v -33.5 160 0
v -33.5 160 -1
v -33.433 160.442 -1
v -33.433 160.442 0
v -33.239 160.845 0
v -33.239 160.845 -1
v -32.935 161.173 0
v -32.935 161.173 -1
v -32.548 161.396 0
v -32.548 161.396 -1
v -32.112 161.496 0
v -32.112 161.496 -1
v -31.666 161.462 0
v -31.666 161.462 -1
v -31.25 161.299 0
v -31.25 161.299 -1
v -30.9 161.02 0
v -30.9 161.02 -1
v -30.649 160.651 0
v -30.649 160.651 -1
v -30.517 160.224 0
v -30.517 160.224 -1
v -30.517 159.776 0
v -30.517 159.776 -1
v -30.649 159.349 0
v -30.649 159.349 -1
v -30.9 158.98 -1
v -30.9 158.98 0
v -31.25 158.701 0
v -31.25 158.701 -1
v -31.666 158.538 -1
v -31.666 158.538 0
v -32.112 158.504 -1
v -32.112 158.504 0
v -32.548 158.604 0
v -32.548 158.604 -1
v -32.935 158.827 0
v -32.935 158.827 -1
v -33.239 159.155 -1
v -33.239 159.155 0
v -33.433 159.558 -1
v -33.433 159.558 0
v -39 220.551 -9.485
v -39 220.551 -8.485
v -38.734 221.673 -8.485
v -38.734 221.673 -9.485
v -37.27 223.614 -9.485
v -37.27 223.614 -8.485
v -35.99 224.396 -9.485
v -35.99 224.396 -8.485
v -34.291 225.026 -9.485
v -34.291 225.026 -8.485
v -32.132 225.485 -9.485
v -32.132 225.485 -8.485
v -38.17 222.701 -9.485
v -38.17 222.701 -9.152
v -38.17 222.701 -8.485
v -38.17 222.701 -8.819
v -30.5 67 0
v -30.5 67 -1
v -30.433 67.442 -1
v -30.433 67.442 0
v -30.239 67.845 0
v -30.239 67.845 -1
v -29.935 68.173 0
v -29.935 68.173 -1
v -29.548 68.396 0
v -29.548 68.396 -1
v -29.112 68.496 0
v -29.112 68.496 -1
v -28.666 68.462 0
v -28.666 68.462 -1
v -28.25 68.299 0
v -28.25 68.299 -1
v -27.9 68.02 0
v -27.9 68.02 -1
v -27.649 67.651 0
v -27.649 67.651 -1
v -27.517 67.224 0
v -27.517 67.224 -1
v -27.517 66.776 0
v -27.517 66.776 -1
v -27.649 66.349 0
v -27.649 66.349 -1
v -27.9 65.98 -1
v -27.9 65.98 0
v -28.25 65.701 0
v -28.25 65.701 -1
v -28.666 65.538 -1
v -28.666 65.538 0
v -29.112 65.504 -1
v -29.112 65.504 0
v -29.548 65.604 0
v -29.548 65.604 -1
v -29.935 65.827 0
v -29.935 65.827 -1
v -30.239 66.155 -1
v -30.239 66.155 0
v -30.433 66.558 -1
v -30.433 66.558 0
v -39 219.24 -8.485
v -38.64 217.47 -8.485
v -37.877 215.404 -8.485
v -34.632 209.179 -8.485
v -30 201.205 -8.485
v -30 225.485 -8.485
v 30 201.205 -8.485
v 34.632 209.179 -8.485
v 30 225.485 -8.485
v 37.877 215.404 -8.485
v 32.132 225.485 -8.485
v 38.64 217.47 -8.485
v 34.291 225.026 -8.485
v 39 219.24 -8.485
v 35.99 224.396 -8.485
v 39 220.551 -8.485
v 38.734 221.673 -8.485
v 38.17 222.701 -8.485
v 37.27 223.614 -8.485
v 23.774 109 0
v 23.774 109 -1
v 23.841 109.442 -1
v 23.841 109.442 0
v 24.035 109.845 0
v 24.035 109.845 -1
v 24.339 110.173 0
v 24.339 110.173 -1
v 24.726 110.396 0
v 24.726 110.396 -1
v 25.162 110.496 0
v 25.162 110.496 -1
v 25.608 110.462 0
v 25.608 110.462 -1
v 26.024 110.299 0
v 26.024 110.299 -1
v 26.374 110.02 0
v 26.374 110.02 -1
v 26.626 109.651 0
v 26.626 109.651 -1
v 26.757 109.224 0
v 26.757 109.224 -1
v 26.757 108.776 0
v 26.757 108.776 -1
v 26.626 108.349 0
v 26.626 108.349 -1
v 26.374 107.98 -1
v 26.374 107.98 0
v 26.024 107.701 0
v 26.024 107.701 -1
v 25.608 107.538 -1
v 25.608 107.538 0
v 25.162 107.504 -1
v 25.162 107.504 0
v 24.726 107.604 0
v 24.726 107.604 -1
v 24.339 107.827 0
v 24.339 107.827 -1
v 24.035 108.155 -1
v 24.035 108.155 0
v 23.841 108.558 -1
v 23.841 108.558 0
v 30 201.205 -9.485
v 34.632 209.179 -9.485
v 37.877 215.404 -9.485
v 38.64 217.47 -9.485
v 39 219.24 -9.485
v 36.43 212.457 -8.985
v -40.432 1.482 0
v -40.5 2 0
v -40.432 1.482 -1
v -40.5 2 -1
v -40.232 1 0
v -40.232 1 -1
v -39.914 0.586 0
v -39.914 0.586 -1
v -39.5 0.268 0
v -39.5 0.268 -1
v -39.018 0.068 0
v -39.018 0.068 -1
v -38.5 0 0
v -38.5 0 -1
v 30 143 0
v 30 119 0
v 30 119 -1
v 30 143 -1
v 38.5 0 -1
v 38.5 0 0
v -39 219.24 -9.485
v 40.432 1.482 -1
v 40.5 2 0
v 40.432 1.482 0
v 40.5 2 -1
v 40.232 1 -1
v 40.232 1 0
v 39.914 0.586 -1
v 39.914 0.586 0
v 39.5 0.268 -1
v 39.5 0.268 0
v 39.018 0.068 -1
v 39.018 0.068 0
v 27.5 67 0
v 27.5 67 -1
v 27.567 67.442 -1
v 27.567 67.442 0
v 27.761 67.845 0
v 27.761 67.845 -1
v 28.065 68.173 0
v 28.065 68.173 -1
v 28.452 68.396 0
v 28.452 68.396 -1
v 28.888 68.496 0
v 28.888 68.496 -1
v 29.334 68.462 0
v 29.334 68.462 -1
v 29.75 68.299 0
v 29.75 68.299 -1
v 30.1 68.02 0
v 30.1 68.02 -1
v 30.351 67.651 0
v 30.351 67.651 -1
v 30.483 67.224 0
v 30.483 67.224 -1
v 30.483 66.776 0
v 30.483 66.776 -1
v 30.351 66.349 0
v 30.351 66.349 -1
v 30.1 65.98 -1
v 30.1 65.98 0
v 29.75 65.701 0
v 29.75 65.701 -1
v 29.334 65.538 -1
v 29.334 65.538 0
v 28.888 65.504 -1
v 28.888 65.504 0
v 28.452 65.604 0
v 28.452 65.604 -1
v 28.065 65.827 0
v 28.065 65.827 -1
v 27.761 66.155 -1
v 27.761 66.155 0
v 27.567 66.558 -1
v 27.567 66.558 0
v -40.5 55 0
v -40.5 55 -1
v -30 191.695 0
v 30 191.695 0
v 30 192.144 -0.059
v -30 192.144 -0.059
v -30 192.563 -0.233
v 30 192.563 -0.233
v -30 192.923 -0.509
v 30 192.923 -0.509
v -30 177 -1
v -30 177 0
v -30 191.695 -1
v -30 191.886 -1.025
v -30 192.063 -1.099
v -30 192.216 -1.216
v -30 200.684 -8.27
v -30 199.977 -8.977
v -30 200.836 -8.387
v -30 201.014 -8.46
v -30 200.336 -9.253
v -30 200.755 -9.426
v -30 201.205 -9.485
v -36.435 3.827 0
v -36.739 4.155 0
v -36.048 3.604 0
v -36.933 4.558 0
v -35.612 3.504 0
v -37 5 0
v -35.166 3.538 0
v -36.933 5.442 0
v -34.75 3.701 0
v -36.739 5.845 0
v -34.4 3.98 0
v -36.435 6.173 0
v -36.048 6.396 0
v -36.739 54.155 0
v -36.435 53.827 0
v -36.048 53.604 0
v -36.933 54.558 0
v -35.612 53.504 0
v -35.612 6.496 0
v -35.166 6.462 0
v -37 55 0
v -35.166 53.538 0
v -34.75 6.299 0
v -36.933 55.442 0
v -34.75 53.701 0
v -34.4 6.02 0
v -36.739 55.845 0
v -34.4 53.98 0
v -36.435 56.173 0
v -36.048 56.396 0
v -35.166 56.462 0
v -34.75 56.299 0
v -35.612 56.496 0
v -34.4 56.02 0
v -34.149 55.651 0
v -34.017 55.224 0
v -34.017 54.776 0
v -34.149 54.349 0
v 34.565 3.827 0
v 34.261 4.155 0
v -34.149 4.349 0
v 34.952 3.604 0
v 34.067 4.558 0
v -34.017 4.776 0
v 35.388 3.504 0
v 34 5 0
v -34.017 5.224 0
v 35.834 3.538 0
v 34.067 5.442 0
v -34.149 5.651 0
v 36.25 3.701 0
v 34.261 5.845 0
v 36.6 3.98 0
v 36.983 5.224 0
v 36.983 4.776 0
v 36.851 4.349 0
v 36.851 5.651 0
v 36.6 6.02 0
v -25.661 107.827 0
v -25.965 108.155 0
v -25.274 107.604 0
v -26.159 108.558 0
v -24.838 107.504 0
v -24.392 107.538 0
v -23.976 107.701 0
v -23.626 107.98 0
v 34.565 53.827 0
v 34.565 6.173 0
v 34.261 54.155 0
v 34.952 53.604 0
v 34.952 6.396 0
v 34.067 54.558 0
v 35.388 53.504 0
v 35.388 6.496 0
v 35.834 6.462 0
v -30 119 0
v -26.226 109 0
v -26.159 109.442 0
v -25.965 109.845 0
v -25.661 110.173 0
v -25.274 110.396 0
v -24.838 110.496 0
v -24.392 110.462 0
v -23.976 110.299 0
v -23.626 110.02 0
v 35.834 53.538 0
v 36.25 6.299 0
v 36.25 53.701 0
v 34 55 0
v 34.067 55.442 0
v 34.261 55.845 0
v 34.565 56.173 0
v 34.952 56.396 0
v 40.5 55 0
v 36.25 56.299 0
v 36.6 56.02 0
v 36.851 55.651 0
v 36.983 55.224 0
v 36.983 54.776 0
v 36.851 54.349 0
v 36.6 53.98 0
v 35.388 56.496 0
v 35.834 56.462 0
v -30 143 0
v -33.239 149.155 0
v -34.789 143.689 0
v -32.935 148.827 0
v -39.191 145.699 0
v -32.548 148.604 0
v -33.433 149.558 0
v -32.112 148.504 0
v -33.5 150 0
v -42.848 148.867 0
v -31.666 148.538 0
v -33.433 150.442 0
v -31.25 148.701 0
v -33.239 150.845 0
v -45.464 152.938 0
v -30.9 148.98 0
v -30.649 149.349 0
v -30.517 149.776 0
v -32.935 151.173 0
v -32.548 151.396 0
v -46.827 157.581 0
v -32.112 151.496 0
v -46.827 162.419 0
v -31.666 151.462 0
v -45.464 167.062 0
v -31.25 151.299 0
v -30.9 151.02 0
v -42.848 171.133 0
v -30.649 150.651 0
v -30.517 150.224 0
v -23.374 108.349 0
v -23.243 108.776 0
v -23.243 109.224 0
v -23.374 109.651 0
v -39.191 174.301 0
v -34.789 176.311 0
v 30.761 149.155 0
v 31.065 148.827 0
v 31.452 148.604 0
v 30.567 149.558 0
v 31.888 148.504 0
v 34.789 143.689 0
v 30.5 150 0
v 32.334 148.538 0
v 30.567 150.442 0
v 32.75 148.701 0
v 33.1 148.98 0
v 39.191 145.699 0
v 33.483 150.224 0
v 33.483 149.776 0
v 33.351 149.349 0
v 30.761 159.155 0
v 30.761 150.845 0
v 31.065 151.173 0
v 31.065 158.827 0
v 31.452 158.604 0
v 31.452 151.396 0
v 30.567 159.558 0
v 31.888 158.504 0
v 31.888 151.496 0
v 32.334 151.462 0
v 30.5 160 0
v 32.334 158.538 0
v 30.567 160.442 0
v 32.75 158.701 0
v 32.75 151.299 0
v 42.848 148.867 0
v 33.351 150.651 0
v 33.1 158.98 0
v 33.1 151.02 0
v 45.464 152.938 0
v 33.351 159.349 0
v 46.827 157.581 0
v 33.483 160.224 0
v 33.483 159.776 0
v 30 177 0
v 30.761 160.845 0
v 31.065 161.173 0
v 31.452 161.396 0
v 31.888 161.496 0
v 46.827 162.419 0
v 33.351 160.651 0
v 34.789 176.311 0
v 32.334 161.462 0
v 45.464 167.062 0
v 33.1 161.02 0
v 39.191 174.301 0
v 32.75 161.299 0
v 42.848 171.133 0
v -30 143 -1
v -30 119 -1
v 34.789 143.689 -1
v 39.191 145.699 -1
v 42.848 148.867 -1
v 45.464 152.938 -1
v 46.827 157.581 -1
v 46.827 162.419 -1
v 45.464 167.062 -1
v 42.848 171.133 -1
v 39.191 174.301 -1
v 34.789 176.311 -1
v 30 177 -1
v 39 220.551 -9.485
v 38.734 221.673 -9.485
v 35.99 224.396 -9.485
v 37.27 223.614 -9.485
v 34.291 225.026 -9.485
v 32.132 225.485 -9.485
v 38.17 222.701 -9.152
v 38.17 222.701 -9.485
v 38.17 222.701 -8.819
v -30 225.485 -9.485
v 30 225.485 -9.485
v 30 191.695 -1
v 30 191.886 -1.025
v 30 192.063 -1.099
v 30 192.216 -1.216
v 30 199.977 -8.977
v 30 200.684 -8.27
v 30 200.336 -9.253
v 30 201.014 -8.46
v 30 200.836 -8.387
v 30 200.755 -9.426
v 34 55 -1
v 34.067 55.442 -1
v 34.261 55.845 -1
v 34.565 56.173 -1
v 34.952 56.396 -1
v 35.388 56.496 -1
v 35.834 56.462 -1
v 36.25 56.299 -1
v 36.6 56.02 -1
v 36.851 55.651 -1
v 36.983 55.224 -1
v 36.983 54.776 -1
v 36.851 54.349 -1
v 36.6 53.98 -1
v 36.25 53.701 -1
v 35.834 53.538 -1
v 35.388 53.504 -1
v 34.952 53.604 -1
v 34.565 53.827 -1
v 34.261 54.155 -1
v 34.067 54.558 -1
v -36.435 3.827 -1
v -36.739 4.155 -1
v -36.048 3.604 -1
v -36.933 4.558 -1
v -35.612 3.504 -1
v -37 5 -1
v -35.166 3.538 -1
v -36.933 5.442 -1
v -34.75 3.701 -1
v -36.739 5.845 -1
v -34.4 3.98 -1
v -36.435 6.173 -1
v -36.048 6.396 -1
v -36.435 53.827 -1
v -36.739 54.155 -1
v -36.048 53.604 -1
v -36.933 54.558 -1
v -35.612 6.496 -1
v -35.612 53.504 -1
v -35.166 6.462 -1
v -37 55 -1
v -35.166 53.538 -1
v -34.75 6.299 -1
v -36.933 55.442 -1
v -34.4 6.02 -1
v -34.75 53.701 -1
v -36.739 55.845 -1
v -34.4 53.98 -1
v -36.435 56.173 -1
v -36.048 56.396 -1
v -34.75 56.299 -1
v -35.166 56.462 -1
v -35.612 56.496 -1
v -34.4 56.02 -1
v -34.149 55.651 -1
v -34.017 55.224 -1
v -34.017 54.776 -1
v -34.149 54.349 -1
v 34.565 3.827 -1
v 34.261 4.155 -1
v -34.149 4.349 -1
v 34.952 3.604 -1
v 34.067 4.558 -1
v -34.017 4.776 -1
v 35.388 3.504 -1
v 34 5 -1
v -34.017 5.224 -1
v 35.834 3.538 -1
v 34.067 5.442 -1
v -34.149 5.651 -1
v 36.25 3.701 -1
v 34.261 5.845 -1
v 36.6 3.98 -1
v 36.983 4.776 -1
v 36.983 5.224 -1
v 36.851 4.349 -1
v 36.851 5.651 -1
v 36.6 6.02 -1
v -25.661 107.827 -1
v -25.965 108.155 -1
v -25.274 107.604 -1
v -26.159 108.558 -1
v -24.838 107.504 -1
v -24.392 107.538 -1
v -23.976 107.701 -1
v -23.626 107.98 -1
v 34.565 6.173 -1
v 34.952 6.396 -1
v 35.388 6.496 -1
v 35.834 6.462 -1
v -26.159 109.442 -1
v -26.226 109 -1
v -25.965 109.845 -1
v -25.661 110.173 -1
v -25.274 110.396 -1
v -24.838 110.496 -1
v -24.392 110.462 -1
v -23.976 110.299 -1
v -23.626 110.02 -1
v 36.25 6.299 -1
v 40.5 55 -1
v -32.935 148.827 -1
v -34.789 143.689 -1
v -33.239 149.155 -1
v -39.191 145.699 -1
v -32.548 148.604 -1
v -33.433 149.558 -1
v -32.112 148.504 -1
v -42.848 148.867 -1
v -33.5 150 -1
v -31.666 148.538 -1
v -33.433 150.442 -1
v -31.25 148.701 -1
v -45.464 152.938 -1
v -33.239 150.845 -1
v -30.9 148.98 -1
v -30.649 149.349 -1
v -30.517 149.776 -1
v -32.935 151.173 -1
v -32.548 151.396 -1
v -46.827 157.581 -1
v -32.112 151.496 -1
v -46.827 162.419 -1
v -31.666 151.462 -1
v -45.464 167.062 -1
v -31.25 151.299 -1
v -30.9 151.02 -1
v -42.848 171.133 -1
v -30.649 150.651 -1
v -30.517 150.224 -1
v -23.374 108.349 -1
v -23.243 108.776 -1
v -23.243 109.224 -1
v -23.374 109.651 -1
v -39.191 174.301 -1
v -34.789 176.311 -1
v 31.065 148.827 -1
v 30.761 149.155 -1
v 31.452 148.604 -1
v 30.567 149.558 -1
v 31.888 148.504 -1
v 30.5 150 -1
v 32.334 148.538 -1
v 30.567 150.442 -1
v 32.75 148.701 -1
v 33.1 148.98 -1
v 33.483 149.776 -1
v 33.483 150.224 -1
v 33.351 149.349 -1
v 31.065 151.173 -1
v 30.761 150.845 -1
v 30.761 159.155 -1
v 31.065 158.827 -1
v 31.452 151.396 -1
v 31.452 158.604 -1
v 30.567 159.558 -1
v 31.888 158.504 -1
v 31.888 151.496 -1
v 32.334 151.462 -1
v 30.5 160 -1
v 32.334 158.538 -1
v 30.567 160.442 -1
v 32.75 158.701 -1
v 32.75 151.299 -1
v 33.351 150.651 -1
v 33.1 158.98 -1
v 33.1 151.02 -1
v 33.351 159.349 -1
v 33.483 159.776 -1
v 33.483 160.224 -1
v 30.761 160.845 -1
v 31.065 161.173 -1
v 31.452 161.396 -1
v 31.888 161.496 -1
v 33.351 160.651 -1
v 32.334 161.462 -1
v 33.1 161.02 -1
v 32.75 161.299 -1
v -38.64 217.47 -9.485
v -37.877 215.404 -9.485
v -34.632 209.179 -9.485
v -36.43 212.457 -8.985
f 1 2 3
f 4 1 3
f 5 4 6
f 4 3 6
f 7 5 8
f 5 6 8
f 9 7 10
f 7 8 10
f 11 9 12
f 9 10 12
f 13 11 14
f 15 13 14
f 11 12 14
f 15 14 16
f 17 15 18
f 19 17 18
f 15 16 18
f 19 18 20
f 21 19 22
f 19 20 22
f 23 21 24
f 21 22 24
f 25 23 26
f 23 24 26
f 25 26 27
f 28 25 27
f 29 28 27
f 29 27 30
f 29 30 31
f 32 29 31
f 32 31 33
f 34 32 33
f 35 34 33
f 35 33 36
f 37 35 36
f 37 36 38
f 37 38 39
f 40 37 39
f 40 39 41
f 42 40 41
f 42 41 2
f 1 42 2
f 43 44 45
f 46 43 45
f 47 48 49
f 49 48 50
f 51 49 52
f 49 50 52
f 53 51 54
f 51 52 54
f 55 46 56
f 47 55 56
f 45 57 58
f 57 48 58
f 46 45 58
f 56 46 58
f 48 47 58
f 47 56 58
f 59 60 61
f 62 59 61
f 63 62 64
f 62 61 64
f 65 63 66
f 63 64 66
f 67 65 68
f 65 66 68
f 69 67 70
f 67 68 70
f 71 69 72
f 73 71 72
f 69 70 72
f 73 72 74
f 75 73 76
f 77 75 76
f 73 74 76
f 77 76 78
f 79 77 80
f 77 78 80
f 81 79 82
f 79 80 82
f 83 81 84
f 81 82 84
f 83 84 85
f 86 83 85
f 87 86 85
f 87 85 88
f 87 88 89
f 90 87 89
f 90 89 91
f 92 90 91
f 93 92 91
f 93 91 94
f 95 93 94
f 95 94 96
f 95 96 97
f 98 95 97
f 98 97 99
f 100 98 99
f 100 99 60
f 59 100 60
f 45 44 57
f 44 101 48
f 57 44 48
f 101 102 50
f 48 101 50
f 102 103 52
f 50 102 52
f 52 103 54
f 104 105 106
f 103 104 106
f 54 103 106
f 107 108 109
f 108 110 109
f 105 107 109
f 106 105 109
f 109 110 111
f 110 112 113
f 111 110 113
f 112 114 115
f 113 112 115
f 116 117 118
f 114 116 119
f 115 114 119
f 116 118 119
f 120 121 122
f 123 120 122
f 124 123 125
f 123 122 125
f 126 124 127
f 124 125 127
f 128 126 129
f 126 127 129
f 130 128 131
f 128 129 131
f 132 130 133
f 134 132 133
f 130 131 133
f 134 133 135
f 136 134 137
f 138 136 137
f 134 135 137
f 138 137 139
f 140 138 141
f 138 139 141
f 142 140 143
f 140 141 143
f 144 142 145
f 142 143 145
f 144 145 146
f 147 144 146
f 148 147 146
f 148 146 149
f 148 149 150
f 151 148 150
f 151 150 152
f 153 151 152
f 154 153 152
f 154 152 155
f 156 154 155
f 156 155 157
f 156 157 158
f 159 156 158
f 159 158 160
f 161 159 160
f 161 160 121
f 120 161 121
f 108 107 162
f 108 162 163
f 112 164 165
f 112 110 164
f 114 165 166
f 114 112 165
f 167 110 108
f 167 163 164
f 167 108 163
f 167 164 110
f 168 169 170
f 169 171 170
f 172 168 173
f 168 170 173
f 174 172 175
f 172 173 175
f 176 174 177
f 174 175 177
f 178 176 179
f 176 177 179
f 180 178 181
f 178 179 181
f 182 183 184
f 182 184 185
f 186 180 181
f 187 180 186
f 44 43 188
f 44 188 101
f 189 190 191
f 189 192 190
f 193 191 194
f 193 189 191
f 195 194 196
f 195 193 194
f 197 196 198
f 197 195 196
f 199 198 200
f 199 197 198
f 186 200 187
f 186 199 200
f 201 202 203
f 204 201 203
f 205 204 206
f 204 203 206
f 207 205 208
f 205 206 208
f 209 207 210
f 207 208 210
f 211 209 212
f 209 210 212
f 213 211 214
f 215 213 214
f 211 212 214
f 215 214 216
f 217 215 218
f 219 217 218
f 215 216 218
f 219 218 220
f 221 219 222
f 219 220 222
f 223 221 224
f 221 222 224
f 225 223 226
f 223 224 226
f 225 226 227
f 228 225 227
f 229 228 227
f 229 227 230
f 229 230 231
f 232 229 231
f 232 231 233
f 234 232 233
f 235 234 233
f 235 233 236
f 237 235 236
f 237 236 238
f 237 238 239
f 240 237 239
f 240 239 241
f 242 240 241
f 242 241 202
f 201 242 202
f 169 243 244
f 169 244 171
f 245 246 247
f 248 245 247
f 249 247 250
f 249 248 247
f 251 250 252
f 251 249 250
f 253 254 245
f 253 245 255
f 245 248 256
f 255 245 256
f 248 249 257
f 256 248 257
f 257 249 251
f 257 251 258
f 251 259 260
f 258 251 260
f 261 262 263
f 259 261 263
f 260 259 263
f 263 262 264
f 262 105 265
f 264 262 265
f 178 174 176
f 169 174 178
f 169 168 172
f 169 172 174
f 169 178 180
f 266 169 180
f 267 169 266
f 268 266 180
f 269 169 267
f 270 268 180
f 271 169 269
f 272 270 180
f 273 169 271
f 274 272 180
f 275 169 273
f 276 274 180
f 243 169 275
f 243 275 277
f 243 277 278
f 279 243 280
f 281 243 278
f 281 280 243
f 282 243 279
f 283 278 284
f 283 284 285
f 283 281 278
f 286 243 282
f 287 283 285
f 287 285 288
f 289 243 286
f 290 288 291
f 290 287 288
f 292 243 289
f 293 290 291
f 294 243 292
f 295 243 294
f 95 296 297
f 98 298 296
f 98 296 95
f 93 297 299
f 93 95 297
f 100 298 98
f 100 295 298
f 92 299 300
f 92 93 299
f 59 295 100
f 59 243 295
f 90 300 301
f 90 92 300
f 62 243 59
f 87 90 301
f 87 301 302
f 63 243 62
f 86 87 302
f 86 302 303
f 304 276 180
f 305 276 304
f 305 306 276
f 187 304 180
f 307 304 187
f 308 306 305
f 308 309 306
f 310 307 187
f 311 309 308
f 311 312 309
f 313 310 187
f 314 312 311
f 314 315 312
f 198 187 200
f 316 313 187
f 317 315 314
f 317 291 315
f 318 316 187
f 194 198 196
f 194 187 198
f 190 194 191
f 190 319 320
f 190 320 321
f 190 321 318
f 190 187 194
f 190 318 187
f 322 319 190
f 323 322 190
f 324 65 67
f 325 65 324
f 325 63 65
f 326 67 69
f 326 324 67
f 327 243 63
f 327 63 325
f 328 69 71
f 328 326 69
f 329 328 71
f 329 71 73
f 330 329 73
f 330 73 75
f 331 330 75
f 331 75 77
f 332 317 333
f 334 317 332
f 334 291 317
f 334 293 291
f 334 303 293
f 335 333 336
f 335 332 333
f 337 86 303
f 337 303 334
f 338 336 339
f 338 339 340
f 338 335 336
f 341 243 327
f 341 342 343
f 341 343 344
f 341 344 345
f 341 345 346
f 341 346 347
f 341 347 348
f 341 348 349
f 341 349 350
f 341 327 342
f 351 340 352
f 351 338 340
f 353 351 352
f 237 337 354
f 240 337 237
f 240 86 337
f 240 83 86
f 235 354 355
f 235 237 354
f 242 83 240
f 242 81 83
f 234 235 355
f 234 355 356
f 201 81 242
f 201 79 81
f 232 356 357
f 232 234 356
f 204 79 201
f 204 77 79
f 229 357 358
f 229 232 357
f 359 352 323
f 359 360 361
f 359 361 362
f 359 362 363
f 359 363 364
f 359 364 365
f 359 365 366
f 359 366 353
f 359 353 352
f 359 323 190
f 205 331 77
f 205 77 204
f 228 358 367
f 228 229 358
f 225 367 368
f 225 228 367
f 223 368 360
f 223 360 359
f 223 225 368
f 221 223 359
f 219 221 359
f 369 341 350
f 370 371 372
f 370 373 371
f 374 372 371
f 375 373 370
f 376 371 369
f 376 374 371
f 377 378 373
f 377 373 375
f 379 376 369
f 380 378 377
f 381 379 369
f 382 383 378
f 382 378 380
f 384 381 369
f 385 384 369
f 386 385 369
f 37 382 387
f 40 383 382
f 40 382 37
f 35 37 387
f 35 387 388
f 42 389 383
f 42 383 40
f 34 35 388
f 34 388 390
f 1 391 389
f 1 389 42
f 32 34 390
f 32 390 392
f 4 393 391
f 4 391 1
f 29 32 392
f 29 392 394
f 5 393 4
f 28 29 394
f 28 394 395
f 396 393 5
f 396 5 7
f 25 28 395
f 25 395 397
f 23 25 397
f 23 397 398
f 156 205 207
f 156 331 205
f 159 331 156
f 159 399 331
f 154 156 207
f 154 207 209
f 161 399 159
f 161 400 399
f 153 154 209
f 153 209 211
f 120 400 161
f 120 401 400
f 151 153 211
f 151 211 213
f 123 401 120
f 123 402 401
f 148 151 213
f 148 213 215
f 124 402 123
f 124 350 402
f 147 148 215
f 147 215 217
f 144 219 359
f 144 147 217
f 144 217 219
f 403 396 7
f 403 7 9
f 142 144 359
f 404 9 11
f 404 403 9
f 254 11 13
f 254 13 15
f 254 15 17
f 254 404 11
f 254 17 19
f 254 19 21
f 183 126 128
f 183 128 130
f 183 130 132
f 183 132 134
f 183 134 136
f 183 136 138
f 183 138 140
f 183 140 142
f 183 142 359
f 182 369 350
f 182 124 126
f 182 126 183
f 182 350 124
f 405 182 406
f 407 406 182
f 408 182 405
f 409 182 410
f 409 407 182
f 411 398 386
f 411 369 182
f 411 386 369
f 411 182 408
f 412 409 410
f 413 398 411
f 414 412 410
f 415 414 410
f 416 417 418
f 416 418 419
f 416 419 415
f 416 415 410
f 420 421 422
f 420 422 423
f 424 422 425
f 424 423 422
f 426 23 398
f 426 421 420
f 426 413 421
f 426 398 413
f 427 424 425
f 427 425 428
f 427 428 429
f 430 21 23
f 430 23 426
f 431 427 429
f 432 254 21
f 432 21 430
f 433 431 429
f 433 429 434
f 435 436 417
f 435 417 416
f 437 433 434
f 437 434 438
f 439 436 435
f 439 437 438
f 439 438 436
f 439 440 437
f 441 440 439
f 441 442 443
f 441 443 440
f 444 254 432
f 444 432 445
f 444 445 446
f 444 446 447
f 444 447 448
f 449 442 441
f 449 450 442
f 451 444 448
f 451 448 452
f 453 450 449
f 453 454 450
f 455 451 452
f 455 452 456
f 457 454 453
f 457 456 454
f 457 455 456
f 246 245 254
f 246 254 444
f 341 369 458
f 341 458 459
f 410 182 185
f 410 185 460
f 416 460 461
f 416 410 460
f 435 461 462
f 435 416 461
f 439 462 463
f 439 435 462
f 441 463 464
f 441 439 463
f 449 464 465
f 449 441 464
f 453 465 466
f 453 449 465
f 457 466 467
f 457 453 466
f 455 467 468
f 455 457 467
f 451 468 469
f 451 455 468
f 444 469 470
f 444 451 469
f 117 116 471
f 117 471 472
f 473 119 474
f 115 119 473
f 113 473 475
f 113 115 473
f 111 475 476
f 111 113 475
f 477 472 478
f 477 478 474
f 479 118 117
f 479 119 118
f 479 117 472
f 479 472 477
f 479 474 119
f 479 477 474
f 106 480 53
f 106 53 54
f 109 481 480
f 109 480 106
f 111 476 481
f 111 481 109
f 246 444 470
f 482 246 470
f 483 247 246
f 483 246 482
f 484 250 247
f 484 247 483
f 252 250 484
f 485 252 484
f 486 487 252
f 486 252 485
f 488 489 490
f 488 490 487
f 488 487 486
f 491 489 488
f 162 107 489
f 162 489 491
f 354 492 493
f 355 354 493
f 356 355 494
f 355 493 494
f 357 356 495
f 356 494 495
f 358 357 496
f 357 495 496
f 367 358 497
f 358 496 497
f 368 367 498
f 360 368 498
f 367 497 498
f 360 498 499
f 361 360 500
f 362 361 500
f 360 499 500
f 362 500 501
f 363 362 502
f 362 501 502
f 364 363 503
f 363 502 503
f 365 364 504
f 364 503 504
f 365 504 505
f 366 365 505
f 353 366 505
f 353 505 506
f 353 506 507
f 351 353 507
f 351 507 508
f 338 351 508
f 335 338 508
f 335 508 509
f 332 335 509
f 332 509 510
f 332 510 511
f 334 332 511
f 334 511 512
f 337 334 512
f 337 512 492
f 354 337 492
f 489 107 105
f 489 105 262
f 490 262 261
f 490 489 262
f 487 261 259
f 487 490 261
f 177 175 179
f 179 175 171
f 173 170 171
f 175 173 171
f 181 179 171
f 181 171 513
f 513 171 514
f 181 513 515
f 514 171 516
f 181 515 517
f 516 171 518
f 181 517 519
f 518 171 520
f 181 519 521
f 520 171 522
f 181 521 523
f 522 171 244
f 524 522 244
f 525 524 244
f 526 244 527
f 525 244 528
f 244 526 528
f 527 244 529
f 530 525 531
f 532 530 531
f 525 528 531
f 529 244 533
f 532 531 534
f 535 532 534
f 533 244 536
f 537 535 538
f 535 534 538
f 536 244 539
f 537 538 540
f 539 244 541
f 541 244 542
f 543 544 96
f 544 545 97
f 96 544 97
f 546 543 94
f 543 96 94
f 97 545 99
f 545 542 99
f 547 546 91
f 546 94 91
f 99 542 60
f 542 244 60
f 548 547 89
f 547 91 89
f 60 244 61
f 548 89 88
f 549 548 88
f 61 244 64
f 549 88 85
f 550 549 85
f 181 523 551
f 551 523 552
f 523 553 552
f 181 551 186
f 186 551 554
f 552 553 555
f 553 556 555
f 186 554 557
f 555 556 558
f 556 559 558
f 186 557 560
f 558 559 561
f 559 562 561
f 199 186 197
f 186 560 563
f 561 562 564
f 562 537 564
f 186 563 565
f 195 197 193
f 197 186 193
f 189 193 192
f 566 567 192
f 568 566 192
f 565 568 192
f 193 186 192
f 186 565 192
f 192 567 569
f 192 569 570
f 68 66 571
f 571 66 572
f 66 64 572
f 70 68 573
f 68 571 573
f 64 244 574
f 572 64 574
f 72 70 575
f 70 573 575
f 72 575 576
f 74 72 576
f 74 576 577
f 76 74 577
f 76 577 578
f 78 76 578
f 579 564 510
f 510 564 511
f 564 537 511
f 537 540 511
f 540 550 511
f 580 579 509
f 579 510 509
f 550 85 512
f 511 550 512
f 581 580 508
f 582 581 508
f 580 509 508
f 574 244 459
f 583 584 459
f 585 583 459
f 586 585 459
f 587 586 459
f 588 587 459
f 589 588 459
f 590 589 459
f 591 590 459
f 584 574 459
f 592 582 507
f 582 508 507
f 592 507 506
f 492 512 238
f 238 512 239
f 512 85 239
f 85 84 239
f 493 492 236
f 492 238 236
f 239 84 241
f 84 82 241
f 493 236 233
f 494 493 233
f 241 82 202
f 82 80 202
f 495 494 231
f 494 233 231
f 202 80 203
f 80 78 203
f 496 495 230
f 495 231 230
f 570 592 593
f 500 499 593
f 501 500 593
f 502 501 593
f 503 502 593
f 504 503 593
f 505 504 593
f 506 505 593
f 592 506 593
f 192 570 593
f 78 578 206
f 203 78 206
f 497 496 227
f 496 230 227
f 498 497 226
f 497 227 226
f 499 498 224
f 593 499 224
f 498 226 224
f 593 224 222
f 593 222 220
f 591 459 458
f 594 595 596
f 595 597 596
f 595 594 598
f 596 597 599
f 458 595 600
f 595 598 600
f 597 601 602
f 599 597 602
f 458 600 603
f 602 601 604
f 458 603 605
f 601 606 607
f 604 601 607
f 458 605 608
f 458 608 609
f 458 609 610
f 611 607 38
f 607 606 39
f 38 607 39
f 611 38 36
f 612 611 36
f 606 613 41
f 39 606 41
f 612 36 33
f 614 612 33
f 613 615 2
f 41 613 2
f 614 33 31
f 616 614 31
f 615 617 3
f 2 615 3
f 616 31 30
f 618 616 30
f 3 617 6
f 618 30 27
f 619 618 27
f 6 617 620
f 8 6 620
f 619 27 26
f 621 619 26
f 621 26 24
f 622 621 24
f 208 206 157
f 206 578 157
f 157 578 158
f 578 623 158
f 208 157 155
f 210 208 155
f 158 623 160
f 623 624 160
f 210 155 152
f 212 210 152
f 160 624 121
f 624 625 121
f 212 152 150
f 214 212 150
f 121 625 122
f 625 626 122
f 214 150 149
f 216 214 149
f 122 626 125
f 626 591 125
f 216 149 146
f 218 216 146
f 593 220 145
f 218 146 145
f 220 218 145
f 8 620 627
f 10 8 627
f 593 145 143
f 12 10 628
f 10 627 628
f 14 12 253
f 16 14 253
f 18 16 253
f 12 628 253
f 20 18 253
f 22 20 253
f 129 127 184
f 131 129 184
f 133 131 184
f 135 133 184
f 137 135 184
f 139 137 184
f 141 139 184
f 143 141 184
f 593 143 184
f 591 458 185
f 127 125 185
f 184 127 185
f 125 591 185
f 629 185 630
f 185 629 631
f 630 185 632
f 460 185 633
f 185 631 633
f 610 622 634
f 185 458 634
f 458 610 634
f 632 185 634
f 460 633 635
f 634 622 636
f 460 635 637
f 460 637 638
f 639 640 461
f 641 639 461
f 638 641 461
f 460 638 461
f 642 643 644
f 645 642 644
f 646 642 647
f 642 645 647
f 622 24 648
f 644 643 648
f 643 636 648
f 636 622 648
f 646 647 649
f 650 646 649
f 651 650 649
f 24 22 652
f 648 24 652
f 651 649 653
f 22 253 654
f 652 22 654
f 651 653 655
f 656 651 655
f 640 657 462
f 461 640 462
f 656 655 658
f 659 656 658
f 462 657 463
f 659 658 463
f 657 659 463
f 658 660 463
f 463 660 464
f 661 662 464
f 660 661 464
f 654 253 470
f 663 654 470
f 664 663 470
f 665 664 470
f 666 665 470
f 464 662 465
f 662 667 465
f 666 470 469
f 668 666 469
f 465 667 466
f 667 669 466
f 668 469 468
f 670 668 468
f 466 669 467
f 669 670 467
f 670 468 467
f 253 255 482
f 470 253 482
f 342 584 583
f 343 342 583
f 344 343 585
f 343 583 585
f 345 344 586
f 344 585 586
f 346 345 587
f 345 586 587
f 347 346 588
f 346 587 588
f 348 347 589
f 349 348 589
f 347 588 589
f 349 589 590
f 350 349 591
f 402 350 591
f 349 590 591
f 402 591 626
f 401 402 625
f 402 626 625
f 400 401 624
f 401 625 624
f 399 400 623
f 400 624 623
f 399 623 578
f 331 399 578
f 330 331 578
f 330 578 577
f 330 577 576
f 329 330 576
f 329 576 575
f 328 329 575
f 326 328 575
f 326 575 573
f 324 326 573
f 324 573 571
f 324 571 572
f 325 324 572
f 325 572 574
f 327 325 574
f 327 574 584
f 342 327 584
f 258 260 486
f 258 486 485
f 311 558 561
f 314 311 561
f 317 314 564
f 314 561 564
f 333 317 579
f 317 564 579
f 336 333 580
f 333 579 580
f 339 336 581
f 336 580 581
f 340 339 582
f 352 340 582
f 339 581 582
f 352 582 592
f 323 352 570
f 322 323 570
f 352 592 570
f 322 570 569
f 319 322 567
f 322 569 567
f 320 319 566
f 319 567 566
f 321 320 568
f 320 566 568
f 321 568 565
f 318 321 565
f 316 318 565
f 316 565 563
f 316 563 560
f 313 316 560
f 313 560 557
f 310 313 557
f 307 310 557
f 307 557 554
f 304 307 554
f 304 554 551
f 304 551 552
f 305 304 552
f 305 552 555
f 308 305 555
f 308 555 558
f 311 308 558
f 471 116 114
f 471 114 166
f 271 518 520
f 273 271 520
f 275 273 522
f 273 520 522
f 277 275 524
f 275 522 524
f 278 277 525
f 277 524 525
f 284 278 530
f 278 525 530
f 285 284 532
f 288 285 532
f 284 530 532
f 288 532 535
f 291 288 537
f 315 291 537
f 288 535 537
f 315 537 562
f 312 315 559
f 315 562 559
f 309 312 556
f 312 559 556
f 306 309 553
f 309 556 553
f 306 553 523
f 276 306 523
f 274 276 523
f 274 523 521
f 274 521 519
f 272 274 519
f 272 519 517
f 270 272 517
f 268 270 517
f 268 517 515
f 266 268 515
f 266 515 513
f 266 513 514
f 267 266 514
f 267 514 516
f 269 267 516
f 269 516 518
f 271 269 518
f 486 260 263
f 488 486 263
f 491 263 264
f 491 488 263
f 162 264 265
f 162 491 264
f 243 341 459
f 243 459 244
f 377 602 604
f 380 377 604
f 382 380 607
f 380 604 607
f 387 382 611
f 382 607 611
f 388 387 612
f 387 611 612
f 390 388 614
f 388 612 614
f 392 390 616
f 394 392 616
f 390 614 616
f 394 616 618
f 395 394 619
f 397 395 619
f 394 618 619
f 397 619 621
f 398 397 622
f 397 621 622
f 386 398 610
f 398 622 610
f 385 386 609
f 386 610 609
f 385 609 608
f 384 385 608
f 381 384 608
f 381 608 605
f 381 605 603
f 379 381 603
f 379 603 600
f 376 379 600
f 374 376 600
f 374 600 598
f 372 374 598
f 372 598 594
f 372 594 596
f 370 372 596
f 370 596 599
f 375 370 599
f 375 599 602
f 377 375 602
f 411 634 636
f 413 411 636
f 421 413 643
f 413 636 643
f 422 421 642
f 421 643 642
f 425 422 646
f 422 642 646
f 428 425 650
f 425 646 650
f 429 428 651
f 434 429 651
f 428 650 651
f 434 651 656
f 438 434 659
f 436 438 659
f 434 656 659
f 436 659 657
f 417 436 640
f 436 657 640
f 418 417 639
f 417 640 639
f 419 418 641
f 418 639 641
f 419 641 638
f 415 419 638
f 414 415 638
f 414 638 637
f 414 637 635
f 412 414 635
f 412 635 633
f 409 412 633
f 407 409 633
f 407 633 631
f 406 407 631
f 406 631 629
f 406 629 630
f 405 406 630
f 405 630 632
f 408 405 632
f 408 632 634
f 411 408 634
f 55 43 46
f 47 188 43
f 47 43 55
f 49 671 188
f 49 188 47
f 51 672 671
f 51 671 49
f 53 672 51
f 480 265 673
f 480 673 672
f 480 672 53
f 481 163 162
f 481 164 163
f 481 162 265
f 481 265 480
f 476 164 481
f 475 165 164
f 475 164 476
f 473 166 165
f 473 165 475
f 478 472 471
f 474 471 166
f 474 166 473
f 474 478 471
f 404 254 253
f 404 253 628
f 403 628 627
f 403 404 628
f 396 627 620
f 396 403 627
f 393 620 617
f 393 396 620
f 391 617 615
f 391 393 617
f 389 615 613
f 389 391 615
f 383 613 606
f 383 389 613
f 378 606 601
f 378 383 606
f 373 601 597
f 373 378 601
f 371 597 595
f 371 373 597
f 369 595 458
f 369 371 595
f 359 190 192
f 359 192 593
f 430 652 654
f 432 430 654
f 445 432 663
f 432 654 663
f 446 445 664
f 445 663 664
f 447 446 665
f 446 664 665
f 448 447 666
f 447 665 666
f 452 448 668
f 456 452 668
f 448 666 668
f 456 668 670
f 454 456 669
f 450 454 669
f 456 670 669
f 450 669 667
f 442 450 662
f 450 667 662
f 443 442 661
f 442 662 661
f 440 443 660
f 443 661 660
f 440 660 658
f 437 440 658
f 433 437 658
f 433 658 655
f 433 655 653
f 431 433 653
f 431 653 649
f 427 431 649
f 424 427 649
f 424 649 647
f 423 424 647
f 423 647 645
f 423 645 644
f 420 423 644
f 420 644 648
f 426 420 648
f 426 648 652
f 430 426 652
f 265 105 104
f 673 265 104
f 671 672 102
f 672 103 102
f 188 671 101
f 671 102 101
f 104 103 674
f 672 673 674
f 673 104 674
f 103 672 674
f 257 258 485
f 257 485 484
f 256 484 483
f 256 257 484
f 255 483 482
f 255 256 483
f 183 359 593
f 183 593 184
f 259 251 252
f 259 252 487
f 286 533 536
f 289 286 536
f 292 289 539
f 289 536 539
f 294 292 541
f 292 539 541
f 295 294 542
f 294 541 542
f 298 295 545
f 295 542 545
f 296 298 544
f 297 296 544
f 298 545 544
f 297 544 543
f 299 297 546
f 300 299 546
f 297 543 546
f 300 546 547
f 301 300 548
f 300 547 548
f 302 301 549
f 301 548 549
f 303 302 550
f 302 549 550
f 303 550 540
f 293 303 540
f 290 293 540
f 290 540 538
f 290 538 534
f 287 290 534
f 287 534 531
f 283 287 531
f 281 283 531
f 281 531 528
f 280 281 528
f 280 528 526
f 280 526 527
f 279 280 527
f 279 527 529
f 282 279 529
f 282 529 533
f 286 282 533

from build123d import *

# Parameters (mm, degrees)
BASE_FLANGE1_DEPTH           = 1
EDGE_FLANGE1_STRIP_CUT_DEPTH = 60
EDGE_FLANGE1_DEPTH           = 60
EDGE_FLANGE2_STRIP_CUT_DEPTH = 60
EDGE_FLANGE2_DEPTH           = 60
SKETCH14_W                   = 1
SKETCH14_H                   = 24.280676727
BOSS_EXTRUDE1_DEPTH          = 9
SKETCH15_W                   = 1
SKETCH15_H                   = 24.280676727
BOSS_EXTRUDE2_DEPTH          = 9
CUT_EXTRUDE1_START           = -1
CUT_EXTRUDE1_DEPTH           = 1
FILLET2_R                    = 2
SKETCH17_R                   = 1.5
CUT_EXTRUDE2_DEPTH           = 231.487770095
SKETCH18_R                   = 1.5
CUT_EXTRUDE3_DEPTH           = 231.487770095
SKETCH19_R                   = 1.5
CUT_EXTRUDE4_DEPTH           = 231.487770095


# Read off the part's stored shape, not the designer's step: Cut-Extrude1
# Sheet-metal steps are written as plain solids
with BuildPart() as part:
    # Sketch1 → Base-Flange1 (new body)
    with BuildSketch(Plane.XY):
        with BuildLine():
            Line((-40.5, 0), (40.5, 0))
            Line((40.5, 0), (40.5, 55))
            Line((40.5, 55), (30, 119))
            Line((30, 119), (30, 143))
            ThreePointArc((30, 143), (47, 160), (30, 177))
            Line((30, 177), (30, 192))
            Line((30, 192), (-30, 192))
            Line((-30, 192), (-30, 177))
            ThreePointArc((-30, 177), (-47, 160), (-30, 143))
            Line((-30, 143), (-30, 119))
            Line((-30, 119), (-40.5, 55))
            Line((-40.5, 55), (-40.5, 0))
        make_face()
    extrude(amount=-BASE_FLANGE1_DEPTH)

    # Edge-Flange1 strip (across the edge) → Edge-Flange1 strip cut (cut)
    with BuildSketch(Plane(origin=(-30, 192, -1), x_dir=(0, -0.7071067811865438, -0.7071067811865512), z_dir=(1, 0, 0))):
        Polygon((-4.361498471, 2.947284909), (-0.491361636, -0.922851926), (0.215745145, -0.215745145), (-3.65439169, 3.65439169), align=None)
    extrude(amount=EDGE_FLANGE1_STRIP_CUT_DEPTH, mode=Mode.SUBTRACT)

    # Edge-Flange1 section (across the edge) → Edge-Flange1 (add)
    with BuildSketch(Plane(origin=(-30, 192, -1), x_dir=(0, -0.7071067811865438, -0.7071067811865512), z_dir=(1, 0, 0))):
        with BuildLine():
            Line((-1, 0.30510971), (-1, 11.585786438))
            Line((-1, 11.585786438), (0, 11.585786438))
            Line((0, 11.585786438), (0, 0.30510971))
            ThreePointArc((0, 0.30510971), (0.056070336, 0.023225094), (0.215745145, -0.215745145))
            Line((0.215745145, -0.215745145), (-0.491361636, -0.922851926))
            ThreePointArc((-0.491361636, -0.922851926), (-0.867809196, -0.359458339), (-1, 0.30510971))
        make_face()
    extrude(amount=EDGE_FLANGE1_DEPTH)

    # Edge-Flange2 strip (across the edge) → Edge-Flange2 strip cut (cut)
    with BuildSketch(Plane(origin=(30, 200.899494937, -8.485281374), x_dir=(0, 0, 1), z_dir=(-1, 0, 0))):
        Polygon((-4.361498471, 2.947284909), (-0.491361636, -0.922851926), (0.215745145, -0.215745145), (-3.65439169, 3.65439169), align=None)
    extrude(amount=EDGE_FLANGE2_STRIP_CUT_DEPTH, mode=Mode.SUBTRACT)

    # Edge-Flange2 section (across the edge) → Edge-Flange2 (add)
    with BuildSketch(Plane(origin=(30, 200.899494937, -8.485281374), x_dir=(0, 0, 1), z_dir=(-1, 0, 0))):
        with BuildLine():
            Line((-1, 0.30510971), (-1, 24.585786438))
            Line((-1, 24.585786438), (0, 24.585786438))
            Line((0, 24.585786438), (0, 0.30510971))
            ThreePointArc((0, 0.30510971), (0.056070336, 0.023225094), (0.215745145, -0.215745145))
            Line((0.215745145, -0.215745145), (-0.491361636, -0.922851926))
            ThreePointArc((-0.491361636, -0.922851926), (-0.867809196, -0.359458339), (-1, 0.30510971))
        make_face()
    extrude(amount=EDGE_FLANGE2_DEPTH)

    # Sketch14 → Boss-Extrude1 (add)
    with BuildSketch(Plane(origin=(30, 0, 0), x_dir=(0, 0, -1), z_dir=(1, 0, 0))):
        with Locations((8.985281374, 213.344943011)):
            Rectangle(SKETCH14_W, SKETCH14_H)
    extrude(amount=BOSS_EXTRUDE1_DEPTH)

    # Sketch15 → Boss-Extrude2 (add)
    with BuildSketch(Plane.ZY.offset(30)):
        with Locations((-8.985281374, 213.344943011)):
            Rectangle(SKETCH15_W, SKETCH15_H)
    extrude(amount=BOSS_EXTRUDE2_DEPTH)

    # Cut-Extrude1 outline → Cut-Extrude1 (cut)
    with BuildSketch(Plane(origin=(0, 0, -9.485281374), x_dir=(-1, 0, 0), z_dir=(0, 0, -1)).offset(CUT_EXTRUDE1_START)):
        with BuildLine():
            Line((39, 201.204604647), (39, 219.240417061))
            add(Edge.make_bspline(
                [(30, 201.204604647), (31.71398357, 204.270148777), (35.194685688, 209.766177292), (38.784446875, 217.082662856), (39, 219.240417061)],
                knots=[0, 0, 0, 0, 0.463591524, 0.691545034, 0.691545034, 0.691545034, 0.691545034], degree=3))
            Line((30, 201.204604647), (39, 201.204604647))
        make_face()
        with BuildLine():
            add(Edge.make_bspline(
                [(39, 220.550582239), (38.73699137, 222.877809464), (36.937902842, 224.748781209), (32.132158029, 225.485281374)],
                knots=[0.73898762, 0.73898762, 0.73898762, 0.73898762, 1, 1, 1, 1], degree=3))
            Line((39, 220.550582239), (39, 225.485281374))
            Line((39, 225.485281374), (32.132158029, 225.485281374))
        make_face()
    cut_extrude1 = extrude(amount=CUT_EXTRUDE1_DEPTH, mode=Mode.SUBTRACT)

    # Mirror1: Cut-Extrude1 across plane
    add(cut_extrude1.mirror(Plane(origin=(0, 0, 0), x_dir=(0, 0, 1), z_dir=(1, 0, 0))), mode=Mode.SUBTRACT)

    # Fillet2
    fillet2_edges = [part.edges().sort_by_distance(p)[0] for p in [
        (40.5, 0, -0.5),
        (-40.5, 0, -0.5),
    ]]
    fillet(fillet2_edges, radius=FILLET2_R)

    # Sketch17 → Cut-Extrude2 (cut, through all)
    with BuildSketch(Plane(origin=(0, 0, -1), x_dir=(-1, 0, 0), z_dir=(0, 0, -1))):
        with Locations((-35.5, 5)):
            Circle(SKETCH17_R)
        with Locations((35.5, 5)):
            Circle(SKETCH17_R)
        with Locations((-35.5, 55)):
            Circle(SKETCH17_R)
        with Locations((35.5, 55)):
            Circle(SKETCH17_R)
    extrude(amount=-CUT_EXTRUDE2_DEPTH, mode=Mode.SUBTRACT)

    # Sketch18 → Cut-Extrude3 (cut, through all)
    with BuildSketch(Plane(origin=(0, 0, -1), x_dir=(-1, 0, 0), z_dir=(0, 0, -1))):
        with Locations((-29, 67)):
            Circle(SKETCH18_R)
        with Locations((29, 67)):
            Circle(SKETCH18_R)
        with Locations((-25.274058899, 109)):
            Circle(SKETCH18_R)
        with Locations((24.725941101, 109)):
            Circle(SKETCH18_R)
    extrude(amount=-CUT_EXTRUDE3_DEPTH, mode=Mode.SUBTRACT)

    # Sketch19 → Cut-Extrude4 (cut, through all)
    with BuildSketch(Plane(origin=(0, 0, -1), x_dir=(-1, 0, 0), z_dir=(0, 0, -1))):
        with Locations((-32, 160)):
            Circle(SKETCH19_R)
        with Locations((32, 160)):
            Circle(SKETCH19_R)
        with Locations((-32, 150)):
            Circle(SKETCH19_R)
        with Locations((32, 150)):
            Circle(SKETCH19_R)
    extrude(amount=-CUT_EXTRUDE4_DEPTH, mode=Mode.SUBTRACT)


solid = part.part
